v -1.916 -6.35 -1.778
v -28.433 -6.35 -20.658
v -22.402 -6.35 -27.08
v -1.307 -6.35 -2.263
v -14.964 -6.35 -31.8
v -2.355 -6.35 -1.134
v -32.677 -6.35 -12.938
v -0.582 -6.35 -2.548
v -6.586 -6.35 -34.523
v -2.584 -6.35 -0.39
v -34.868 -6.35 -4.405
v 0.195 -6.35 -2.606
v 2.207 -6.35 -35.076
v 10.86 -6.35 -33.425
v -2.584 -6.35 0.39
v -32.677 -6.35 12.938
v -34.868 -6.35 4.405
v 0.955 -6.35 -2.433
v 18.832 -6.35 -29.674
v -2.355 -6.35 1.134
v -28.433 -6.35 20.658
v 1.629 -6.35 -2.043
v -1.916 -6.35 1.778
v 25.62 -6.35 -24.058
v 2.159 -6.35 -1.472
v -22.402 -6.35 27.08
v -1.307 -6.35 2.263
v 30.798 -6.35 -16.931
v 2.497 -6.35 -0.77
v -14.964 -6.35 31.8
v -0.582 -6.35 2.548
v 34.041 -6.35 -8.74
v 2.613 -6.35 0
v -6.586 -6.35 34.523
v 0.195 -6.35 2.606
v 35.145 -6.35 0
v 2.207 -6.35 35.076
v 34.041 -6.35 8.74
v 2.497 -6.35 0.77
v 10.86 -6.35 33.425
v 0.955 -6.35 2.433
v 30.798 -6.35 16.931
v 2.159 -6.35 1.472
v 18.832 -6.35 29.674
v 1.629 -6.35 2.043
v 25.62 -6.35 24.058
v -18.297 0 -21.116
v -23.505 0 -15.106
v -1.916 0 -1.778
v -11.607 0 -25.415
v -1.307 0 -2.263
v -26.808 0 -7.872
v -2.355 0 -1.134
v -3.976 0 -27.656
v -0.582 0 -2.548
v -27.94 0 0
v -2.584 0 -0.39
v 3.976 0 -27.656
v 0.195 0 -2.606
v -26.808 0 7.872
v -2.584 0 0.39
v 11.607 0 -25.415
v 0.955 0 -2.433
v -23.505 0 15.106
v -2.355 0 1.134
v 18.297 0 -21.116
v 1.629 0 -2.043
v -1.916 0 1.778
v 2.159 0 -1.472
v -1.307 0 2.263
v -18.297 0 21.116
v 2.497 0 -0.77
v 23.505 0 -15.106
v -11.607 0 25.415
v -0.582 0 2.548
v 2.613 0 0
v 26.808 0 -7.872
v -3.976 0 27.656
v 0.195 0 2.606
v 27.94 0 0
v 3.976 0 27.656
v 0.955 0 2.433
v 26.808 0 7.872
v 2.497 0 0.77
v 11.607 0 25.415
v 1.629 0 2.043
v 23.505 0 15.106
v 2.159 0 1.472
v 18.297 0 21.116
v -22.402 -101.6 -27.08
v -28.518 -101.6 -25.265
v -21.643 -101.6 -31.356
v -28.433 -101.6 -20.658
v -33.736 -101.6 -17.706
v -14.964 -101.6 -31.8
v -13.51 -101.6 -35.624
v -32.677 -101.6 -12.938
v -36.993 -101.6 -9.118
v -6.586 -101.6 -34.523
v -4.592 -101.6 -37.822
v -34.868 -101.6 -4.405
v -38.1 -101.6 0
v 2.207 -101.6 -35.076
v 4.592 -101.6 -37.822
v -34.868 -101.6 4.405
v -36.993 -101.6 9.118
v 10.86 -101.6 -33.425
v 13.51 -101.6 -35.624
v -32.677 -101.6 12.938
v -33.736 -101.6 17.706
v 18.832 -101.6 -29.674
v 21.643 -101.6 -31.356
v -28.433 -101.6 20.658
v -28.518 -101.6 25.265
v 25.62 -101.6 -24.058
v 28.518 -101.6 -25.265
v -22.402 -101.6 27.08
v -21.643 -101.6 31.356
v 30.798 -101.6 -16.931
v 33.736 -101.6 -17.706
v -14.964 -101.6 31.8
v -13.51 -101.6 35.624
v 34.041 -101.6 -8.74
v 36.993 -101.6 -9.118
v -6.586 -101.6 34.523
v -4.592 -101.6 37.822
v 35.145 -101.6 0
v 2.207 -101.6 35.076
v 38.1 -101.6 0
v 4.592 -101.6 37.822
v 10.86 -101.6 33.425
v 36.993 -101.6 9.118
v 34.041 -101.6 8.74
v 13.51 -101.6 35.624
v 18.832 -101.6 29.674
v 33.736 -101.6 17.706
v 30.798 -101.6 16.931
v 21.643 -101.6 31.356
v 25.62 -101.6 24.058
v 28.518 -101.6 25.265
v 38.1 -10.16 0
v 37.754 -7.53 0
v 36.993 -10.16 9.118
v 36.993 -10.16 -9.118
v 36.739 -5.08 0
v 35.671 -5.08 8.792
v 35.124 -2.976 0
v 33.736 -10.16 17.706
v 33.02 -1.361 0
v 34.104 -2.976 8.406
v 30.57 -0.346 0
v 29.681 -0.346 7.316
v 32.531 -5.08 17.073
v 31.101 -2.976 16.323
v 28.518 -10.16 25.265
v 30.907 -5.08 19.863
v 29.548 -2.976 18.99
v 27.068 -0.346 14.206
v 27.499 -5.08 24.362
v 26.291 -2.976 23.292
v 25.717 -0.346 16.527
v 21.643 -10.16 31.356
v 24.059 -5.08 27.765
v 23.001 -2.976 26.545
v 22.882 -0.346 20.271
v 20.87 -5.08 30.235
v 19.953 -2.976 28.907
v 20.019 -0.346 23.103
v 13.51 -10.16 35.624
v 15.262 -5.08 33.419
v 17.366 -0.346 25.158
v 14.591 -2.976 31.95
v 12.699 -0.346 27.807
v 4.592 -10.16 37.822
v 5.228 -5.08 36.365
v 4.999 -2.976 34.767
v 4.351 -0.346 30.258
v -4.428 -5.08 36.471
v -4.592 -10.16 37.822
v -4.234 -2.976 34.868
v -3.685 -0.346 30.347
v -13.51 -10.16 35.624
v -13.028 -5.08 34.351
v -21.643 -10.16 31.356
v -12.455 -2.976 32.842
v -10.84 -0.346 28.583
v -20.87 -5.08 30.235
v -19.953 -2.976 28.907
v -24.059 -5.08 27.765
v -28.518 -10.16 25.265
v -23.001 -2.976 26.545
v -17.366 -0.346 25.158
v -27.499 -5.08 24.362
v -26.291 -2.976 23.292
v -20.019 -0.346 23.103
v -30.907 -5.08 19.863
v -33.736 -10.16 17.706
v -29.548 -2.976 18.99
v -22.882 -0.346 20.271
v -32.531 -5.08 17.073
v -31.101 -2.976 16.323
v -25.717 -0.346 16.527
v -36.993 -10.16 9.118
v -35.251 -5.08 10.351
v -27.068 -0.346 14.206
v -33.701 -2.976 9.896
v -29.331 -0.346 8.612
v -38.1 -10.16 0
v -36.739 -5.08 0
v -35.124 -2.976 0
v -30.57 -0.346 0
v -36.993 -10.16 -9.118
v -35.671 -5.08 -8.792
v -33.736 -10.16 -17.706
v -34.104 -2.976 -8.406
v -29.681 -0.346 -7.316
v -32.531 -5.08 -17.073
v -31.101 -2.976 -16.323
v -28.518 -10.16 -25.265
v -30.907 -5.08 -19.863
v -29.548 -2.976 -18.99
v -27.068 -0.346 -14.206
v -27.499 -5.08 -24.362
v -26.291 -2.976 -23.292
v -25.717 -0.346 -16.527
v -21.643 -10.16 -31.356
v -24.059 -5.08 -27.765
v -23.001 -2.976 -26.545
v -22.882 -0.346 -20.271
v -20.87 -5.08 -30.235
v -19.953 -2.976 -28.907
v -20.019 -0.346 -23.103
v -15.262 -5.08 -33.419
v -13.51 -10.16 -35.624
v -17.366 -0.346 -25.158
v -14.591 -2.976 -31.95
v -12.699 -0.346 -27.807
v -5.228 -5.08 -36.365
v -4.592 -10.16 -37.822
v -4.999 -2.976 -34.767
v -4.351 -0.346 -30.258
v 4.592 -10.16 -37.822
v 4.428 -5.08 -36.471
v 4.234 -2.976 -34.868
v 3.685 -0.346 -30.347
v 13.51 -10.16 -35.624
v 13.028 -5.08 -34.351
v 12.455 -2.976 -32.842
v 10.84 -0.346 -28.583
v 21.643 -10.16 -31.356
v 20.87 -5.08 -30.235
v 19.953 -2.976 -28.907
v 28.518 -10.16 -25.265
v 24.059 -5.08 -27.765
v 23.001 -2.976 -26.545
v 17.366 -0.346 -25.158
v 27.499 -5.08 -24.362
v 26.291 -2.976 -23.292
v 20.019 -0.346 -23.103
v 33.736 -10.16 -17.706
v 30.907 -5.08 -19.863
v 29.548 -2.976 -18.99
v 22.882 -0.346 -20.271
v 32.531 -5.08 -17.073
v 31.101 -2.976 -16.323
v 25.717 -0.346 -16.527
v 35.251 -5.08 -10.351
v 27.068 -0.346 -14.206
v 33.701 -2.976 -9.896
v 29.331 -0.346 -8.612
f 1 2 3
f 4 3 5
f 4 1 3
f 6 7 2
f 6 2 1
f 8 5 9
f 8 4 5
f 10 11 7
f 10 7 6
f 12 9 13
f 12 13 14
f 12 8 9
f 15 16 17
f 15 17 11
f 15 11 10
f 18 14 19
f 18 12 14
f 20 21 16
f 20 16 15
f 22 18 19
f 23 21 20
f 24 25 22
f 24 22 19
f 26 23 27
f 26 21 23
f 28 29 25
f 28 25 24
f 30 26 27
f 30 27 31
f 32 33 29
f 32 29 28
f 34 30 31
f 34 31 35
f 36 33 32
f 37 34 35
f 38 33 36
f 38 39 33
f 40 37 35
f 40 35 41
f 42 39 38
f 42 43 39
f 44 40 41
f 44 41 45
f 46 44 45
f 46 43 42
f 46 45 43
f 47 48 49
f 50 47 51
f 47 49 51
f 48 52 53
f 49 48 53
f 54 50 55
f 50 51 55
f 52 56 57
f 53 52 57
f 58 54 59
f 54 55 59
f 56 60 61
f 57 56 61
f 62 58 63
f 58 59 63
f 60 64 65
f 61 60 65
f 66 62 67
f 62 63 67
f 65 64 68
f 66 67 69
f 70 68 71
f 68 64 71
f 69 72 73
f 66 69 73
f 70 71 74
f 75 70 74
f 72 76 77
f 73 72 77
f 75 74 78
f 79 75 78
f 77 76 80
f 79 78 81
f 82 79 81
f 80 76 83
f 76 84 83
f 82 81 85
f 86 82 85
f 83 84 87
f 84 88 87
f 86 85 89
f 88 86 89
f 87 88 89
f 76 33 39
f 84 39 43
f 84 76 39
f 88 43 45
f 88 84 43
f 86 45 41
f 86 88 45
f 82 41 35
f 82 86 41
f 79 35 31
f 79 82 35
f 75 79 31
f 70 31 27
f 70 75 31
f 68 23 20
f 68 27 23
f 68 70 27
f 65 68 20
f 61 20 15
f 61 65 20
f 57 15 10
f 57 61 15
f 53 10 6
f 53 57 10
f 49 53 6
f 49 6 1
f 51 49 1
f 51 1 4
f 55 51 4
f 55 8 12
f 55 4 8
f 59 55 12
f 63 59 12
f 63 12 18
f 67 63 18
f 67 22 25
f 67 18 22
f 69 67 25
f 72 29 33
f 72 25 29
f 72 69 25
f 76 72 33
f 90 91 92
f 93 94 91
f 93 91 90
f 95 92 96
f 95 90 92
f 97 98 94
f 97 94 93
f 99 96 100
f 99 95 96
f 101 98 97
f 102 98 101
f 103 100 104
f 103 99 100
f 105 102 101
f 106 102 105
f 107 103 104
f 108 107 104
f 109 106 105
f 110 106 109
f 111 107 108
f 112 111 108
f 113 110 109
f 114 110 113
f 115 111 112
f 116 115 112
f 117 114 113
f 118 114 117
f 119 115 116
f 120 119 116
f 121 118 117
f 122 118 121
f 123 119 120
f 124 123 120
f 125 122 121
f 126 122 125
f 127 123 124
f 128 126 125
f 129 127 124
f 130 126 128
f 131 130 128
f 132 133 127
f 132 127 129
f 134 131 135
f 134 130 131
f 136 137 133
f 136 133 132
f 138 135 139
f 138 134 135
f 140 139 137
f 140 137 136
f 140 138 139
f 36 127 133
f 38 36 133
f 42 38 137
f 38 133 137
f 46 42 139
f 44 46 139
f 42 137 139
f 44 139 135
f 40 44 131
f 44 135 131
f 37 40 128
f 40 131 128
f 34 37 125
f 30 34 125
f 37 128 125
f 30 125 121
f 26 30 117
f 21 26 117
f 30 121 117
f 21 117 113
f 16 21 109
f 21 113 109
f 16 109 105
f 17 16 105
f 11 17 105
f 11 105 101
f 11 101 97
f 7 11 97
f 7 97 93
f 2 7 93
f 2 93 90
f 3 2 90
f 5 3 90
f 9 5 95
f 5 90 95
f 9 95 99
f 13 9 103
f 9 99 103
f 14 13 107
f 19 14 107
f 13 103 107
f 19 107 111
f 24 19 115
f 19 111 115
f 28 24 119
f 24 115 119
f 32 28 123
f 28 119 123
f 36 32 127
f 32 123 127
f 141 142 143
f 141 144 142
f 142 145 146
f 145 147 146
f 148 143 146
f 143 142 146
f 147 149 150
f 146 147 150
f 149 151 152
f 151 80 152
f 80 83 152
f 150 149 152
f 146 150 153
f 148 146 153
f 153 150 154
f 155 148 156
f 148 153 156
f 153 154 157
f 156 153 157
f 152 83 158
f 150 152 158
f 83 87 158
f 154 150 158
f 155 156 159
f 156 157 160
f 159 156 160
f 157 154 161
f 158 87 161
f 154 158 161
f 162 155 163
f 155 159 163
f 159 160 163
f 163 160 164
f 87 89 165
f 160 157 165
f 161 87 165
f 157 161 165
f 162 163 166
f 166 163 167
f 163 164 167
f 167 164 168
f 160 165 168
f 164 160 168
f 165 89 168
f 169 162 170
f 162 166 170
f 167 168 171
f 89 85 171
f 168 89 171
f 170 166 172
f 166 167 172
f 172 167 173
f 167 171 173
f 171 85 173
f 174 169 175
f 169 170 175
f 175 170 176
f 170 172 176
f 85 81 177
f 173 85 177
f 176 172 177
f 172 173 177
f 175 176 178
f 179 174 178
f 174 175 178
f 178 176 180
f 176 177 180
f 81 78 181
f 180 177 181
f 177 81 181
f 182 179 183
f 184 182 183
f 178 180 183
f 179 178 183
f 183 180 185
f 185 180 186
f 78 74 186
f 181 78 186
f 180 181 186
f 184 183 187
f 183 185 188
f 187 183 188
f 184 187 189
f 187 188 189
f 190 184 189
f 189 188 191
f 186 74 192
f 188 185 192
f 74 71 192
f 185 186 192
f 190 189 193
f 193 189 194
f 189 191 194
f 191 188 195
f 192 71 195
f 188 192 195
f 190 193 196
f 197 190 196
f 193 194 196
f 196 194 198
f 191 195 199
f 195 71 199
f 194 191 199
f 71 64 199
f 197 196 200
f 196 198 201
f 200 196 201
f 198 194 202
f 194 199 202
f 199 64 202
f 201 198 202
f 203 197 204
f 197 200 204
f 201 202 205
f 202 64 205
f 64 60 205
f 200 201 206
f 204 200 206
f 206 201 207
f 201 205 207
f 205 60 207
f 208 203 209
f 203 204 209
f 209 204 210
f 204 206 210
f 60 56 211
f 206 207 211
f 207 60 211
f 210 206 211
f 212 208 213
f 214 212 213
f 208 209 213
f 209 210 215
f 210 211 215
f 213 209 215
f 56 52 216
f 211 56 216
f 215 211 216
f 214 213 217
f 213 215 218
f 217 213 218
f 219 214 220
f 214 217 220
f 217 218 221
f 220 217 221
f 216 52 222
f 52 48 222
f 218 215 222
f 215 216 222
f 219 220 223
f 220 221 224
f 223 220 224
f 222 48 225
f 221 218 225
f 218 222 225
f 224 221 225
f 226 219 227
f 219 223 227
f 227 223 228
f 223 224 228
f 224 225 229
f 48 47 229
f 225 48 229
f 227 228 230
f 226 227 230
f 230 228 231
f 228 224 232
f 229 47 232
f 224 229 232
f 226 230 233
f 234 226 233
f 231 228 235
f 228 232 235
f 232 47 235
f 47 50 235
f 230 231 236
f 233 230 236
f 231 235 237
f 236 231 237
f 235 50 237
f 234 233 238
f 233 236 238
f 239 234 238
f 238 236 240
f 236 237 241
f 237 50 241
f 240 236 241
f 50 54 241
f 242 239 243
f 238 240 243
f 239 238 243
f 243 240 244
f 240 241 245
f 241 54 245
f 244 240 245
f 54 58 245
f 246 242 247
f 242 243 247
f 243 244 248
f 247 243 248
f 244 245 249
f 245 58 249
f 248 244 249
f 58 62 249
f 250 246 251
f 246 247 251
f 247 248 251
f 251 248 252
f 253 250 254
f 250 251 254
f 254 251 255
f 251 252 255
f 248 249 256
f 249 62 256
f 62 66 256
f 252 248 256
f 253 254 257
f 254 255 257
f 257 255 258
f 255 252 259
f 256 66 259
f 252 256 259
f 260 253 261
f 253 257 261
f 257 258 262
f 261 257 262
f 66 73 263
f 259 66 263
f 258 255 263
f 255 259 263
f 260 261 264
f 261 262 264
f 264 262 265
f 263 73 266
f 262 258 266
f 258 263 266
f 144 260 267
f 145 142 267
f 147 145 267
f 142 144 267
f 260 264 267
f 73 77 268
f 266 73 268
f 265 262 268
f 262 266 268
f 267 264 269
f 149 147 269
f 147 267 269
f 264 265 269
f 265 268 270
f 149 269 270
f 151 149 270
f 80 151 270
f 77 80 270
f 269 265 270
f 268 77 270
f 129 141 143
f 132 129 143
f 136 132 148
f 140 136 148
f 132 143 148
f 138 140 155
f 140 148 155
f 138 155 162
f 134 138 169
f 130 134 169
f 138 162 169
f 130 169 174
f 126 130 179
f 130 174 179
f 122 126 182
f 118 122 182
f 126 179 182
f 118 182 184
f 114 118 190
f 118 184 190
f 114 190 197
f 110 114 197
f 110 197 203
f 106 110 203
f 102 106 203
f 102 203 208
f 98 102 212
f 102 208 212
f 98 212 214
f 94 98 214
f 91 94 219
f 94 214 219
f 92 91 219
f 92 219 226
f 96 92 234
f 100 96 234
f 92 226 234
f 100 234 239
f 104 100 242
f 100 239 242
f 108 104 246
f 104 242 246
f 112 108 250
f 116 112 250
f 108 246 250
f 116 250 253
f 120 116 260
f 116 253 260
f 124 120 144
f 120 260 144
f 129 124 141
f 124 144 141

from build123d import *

# Parameters (mm, degrees)
F0_R     = 38.1
F0_R_2   = 34.063477528
F1_DEPTH = 101.6
F2_R     = 35.1450557453
F3_DEPTH = 95.25
F4_R     = 10.16
F5_R     = 2.6133627802
F6_DEPTH = 101.601


with BuildPart() as f1:
    # F0 (on Front) → F1 (new body)
    with BuildSketch(Plane.XZ):
        Circle(F0_R)
        Circle(F0_R_2, mode=Mode.SUBTRACT)
        Circle(F0_R_2)
    extrude(amount=F1_DEPTH)

    # F2 (on face) → F3 (cut)
    with BuildSketch(Plane.XZ.offset(101.6)):
        Circle(F2_R)
    extrude(amount=-F3_DEPTH, mode=Mode.SUBTRACT)

    # F4
    f4_edges = [f1.edges().sort_by_distance(p)[0] for p in [
        (-38.1, 0, 0),
    ]]
    fillet(f4_edges, radius=F4_R)

    # F5 (on Front) → F6 (cut, through all)
    with BuildSketch(Plane.XZ):
        Circle(F5_R)
    extrude(amount=F6_DEPTH, mode=Mode.SUBTRACT)


solid = f1.part
